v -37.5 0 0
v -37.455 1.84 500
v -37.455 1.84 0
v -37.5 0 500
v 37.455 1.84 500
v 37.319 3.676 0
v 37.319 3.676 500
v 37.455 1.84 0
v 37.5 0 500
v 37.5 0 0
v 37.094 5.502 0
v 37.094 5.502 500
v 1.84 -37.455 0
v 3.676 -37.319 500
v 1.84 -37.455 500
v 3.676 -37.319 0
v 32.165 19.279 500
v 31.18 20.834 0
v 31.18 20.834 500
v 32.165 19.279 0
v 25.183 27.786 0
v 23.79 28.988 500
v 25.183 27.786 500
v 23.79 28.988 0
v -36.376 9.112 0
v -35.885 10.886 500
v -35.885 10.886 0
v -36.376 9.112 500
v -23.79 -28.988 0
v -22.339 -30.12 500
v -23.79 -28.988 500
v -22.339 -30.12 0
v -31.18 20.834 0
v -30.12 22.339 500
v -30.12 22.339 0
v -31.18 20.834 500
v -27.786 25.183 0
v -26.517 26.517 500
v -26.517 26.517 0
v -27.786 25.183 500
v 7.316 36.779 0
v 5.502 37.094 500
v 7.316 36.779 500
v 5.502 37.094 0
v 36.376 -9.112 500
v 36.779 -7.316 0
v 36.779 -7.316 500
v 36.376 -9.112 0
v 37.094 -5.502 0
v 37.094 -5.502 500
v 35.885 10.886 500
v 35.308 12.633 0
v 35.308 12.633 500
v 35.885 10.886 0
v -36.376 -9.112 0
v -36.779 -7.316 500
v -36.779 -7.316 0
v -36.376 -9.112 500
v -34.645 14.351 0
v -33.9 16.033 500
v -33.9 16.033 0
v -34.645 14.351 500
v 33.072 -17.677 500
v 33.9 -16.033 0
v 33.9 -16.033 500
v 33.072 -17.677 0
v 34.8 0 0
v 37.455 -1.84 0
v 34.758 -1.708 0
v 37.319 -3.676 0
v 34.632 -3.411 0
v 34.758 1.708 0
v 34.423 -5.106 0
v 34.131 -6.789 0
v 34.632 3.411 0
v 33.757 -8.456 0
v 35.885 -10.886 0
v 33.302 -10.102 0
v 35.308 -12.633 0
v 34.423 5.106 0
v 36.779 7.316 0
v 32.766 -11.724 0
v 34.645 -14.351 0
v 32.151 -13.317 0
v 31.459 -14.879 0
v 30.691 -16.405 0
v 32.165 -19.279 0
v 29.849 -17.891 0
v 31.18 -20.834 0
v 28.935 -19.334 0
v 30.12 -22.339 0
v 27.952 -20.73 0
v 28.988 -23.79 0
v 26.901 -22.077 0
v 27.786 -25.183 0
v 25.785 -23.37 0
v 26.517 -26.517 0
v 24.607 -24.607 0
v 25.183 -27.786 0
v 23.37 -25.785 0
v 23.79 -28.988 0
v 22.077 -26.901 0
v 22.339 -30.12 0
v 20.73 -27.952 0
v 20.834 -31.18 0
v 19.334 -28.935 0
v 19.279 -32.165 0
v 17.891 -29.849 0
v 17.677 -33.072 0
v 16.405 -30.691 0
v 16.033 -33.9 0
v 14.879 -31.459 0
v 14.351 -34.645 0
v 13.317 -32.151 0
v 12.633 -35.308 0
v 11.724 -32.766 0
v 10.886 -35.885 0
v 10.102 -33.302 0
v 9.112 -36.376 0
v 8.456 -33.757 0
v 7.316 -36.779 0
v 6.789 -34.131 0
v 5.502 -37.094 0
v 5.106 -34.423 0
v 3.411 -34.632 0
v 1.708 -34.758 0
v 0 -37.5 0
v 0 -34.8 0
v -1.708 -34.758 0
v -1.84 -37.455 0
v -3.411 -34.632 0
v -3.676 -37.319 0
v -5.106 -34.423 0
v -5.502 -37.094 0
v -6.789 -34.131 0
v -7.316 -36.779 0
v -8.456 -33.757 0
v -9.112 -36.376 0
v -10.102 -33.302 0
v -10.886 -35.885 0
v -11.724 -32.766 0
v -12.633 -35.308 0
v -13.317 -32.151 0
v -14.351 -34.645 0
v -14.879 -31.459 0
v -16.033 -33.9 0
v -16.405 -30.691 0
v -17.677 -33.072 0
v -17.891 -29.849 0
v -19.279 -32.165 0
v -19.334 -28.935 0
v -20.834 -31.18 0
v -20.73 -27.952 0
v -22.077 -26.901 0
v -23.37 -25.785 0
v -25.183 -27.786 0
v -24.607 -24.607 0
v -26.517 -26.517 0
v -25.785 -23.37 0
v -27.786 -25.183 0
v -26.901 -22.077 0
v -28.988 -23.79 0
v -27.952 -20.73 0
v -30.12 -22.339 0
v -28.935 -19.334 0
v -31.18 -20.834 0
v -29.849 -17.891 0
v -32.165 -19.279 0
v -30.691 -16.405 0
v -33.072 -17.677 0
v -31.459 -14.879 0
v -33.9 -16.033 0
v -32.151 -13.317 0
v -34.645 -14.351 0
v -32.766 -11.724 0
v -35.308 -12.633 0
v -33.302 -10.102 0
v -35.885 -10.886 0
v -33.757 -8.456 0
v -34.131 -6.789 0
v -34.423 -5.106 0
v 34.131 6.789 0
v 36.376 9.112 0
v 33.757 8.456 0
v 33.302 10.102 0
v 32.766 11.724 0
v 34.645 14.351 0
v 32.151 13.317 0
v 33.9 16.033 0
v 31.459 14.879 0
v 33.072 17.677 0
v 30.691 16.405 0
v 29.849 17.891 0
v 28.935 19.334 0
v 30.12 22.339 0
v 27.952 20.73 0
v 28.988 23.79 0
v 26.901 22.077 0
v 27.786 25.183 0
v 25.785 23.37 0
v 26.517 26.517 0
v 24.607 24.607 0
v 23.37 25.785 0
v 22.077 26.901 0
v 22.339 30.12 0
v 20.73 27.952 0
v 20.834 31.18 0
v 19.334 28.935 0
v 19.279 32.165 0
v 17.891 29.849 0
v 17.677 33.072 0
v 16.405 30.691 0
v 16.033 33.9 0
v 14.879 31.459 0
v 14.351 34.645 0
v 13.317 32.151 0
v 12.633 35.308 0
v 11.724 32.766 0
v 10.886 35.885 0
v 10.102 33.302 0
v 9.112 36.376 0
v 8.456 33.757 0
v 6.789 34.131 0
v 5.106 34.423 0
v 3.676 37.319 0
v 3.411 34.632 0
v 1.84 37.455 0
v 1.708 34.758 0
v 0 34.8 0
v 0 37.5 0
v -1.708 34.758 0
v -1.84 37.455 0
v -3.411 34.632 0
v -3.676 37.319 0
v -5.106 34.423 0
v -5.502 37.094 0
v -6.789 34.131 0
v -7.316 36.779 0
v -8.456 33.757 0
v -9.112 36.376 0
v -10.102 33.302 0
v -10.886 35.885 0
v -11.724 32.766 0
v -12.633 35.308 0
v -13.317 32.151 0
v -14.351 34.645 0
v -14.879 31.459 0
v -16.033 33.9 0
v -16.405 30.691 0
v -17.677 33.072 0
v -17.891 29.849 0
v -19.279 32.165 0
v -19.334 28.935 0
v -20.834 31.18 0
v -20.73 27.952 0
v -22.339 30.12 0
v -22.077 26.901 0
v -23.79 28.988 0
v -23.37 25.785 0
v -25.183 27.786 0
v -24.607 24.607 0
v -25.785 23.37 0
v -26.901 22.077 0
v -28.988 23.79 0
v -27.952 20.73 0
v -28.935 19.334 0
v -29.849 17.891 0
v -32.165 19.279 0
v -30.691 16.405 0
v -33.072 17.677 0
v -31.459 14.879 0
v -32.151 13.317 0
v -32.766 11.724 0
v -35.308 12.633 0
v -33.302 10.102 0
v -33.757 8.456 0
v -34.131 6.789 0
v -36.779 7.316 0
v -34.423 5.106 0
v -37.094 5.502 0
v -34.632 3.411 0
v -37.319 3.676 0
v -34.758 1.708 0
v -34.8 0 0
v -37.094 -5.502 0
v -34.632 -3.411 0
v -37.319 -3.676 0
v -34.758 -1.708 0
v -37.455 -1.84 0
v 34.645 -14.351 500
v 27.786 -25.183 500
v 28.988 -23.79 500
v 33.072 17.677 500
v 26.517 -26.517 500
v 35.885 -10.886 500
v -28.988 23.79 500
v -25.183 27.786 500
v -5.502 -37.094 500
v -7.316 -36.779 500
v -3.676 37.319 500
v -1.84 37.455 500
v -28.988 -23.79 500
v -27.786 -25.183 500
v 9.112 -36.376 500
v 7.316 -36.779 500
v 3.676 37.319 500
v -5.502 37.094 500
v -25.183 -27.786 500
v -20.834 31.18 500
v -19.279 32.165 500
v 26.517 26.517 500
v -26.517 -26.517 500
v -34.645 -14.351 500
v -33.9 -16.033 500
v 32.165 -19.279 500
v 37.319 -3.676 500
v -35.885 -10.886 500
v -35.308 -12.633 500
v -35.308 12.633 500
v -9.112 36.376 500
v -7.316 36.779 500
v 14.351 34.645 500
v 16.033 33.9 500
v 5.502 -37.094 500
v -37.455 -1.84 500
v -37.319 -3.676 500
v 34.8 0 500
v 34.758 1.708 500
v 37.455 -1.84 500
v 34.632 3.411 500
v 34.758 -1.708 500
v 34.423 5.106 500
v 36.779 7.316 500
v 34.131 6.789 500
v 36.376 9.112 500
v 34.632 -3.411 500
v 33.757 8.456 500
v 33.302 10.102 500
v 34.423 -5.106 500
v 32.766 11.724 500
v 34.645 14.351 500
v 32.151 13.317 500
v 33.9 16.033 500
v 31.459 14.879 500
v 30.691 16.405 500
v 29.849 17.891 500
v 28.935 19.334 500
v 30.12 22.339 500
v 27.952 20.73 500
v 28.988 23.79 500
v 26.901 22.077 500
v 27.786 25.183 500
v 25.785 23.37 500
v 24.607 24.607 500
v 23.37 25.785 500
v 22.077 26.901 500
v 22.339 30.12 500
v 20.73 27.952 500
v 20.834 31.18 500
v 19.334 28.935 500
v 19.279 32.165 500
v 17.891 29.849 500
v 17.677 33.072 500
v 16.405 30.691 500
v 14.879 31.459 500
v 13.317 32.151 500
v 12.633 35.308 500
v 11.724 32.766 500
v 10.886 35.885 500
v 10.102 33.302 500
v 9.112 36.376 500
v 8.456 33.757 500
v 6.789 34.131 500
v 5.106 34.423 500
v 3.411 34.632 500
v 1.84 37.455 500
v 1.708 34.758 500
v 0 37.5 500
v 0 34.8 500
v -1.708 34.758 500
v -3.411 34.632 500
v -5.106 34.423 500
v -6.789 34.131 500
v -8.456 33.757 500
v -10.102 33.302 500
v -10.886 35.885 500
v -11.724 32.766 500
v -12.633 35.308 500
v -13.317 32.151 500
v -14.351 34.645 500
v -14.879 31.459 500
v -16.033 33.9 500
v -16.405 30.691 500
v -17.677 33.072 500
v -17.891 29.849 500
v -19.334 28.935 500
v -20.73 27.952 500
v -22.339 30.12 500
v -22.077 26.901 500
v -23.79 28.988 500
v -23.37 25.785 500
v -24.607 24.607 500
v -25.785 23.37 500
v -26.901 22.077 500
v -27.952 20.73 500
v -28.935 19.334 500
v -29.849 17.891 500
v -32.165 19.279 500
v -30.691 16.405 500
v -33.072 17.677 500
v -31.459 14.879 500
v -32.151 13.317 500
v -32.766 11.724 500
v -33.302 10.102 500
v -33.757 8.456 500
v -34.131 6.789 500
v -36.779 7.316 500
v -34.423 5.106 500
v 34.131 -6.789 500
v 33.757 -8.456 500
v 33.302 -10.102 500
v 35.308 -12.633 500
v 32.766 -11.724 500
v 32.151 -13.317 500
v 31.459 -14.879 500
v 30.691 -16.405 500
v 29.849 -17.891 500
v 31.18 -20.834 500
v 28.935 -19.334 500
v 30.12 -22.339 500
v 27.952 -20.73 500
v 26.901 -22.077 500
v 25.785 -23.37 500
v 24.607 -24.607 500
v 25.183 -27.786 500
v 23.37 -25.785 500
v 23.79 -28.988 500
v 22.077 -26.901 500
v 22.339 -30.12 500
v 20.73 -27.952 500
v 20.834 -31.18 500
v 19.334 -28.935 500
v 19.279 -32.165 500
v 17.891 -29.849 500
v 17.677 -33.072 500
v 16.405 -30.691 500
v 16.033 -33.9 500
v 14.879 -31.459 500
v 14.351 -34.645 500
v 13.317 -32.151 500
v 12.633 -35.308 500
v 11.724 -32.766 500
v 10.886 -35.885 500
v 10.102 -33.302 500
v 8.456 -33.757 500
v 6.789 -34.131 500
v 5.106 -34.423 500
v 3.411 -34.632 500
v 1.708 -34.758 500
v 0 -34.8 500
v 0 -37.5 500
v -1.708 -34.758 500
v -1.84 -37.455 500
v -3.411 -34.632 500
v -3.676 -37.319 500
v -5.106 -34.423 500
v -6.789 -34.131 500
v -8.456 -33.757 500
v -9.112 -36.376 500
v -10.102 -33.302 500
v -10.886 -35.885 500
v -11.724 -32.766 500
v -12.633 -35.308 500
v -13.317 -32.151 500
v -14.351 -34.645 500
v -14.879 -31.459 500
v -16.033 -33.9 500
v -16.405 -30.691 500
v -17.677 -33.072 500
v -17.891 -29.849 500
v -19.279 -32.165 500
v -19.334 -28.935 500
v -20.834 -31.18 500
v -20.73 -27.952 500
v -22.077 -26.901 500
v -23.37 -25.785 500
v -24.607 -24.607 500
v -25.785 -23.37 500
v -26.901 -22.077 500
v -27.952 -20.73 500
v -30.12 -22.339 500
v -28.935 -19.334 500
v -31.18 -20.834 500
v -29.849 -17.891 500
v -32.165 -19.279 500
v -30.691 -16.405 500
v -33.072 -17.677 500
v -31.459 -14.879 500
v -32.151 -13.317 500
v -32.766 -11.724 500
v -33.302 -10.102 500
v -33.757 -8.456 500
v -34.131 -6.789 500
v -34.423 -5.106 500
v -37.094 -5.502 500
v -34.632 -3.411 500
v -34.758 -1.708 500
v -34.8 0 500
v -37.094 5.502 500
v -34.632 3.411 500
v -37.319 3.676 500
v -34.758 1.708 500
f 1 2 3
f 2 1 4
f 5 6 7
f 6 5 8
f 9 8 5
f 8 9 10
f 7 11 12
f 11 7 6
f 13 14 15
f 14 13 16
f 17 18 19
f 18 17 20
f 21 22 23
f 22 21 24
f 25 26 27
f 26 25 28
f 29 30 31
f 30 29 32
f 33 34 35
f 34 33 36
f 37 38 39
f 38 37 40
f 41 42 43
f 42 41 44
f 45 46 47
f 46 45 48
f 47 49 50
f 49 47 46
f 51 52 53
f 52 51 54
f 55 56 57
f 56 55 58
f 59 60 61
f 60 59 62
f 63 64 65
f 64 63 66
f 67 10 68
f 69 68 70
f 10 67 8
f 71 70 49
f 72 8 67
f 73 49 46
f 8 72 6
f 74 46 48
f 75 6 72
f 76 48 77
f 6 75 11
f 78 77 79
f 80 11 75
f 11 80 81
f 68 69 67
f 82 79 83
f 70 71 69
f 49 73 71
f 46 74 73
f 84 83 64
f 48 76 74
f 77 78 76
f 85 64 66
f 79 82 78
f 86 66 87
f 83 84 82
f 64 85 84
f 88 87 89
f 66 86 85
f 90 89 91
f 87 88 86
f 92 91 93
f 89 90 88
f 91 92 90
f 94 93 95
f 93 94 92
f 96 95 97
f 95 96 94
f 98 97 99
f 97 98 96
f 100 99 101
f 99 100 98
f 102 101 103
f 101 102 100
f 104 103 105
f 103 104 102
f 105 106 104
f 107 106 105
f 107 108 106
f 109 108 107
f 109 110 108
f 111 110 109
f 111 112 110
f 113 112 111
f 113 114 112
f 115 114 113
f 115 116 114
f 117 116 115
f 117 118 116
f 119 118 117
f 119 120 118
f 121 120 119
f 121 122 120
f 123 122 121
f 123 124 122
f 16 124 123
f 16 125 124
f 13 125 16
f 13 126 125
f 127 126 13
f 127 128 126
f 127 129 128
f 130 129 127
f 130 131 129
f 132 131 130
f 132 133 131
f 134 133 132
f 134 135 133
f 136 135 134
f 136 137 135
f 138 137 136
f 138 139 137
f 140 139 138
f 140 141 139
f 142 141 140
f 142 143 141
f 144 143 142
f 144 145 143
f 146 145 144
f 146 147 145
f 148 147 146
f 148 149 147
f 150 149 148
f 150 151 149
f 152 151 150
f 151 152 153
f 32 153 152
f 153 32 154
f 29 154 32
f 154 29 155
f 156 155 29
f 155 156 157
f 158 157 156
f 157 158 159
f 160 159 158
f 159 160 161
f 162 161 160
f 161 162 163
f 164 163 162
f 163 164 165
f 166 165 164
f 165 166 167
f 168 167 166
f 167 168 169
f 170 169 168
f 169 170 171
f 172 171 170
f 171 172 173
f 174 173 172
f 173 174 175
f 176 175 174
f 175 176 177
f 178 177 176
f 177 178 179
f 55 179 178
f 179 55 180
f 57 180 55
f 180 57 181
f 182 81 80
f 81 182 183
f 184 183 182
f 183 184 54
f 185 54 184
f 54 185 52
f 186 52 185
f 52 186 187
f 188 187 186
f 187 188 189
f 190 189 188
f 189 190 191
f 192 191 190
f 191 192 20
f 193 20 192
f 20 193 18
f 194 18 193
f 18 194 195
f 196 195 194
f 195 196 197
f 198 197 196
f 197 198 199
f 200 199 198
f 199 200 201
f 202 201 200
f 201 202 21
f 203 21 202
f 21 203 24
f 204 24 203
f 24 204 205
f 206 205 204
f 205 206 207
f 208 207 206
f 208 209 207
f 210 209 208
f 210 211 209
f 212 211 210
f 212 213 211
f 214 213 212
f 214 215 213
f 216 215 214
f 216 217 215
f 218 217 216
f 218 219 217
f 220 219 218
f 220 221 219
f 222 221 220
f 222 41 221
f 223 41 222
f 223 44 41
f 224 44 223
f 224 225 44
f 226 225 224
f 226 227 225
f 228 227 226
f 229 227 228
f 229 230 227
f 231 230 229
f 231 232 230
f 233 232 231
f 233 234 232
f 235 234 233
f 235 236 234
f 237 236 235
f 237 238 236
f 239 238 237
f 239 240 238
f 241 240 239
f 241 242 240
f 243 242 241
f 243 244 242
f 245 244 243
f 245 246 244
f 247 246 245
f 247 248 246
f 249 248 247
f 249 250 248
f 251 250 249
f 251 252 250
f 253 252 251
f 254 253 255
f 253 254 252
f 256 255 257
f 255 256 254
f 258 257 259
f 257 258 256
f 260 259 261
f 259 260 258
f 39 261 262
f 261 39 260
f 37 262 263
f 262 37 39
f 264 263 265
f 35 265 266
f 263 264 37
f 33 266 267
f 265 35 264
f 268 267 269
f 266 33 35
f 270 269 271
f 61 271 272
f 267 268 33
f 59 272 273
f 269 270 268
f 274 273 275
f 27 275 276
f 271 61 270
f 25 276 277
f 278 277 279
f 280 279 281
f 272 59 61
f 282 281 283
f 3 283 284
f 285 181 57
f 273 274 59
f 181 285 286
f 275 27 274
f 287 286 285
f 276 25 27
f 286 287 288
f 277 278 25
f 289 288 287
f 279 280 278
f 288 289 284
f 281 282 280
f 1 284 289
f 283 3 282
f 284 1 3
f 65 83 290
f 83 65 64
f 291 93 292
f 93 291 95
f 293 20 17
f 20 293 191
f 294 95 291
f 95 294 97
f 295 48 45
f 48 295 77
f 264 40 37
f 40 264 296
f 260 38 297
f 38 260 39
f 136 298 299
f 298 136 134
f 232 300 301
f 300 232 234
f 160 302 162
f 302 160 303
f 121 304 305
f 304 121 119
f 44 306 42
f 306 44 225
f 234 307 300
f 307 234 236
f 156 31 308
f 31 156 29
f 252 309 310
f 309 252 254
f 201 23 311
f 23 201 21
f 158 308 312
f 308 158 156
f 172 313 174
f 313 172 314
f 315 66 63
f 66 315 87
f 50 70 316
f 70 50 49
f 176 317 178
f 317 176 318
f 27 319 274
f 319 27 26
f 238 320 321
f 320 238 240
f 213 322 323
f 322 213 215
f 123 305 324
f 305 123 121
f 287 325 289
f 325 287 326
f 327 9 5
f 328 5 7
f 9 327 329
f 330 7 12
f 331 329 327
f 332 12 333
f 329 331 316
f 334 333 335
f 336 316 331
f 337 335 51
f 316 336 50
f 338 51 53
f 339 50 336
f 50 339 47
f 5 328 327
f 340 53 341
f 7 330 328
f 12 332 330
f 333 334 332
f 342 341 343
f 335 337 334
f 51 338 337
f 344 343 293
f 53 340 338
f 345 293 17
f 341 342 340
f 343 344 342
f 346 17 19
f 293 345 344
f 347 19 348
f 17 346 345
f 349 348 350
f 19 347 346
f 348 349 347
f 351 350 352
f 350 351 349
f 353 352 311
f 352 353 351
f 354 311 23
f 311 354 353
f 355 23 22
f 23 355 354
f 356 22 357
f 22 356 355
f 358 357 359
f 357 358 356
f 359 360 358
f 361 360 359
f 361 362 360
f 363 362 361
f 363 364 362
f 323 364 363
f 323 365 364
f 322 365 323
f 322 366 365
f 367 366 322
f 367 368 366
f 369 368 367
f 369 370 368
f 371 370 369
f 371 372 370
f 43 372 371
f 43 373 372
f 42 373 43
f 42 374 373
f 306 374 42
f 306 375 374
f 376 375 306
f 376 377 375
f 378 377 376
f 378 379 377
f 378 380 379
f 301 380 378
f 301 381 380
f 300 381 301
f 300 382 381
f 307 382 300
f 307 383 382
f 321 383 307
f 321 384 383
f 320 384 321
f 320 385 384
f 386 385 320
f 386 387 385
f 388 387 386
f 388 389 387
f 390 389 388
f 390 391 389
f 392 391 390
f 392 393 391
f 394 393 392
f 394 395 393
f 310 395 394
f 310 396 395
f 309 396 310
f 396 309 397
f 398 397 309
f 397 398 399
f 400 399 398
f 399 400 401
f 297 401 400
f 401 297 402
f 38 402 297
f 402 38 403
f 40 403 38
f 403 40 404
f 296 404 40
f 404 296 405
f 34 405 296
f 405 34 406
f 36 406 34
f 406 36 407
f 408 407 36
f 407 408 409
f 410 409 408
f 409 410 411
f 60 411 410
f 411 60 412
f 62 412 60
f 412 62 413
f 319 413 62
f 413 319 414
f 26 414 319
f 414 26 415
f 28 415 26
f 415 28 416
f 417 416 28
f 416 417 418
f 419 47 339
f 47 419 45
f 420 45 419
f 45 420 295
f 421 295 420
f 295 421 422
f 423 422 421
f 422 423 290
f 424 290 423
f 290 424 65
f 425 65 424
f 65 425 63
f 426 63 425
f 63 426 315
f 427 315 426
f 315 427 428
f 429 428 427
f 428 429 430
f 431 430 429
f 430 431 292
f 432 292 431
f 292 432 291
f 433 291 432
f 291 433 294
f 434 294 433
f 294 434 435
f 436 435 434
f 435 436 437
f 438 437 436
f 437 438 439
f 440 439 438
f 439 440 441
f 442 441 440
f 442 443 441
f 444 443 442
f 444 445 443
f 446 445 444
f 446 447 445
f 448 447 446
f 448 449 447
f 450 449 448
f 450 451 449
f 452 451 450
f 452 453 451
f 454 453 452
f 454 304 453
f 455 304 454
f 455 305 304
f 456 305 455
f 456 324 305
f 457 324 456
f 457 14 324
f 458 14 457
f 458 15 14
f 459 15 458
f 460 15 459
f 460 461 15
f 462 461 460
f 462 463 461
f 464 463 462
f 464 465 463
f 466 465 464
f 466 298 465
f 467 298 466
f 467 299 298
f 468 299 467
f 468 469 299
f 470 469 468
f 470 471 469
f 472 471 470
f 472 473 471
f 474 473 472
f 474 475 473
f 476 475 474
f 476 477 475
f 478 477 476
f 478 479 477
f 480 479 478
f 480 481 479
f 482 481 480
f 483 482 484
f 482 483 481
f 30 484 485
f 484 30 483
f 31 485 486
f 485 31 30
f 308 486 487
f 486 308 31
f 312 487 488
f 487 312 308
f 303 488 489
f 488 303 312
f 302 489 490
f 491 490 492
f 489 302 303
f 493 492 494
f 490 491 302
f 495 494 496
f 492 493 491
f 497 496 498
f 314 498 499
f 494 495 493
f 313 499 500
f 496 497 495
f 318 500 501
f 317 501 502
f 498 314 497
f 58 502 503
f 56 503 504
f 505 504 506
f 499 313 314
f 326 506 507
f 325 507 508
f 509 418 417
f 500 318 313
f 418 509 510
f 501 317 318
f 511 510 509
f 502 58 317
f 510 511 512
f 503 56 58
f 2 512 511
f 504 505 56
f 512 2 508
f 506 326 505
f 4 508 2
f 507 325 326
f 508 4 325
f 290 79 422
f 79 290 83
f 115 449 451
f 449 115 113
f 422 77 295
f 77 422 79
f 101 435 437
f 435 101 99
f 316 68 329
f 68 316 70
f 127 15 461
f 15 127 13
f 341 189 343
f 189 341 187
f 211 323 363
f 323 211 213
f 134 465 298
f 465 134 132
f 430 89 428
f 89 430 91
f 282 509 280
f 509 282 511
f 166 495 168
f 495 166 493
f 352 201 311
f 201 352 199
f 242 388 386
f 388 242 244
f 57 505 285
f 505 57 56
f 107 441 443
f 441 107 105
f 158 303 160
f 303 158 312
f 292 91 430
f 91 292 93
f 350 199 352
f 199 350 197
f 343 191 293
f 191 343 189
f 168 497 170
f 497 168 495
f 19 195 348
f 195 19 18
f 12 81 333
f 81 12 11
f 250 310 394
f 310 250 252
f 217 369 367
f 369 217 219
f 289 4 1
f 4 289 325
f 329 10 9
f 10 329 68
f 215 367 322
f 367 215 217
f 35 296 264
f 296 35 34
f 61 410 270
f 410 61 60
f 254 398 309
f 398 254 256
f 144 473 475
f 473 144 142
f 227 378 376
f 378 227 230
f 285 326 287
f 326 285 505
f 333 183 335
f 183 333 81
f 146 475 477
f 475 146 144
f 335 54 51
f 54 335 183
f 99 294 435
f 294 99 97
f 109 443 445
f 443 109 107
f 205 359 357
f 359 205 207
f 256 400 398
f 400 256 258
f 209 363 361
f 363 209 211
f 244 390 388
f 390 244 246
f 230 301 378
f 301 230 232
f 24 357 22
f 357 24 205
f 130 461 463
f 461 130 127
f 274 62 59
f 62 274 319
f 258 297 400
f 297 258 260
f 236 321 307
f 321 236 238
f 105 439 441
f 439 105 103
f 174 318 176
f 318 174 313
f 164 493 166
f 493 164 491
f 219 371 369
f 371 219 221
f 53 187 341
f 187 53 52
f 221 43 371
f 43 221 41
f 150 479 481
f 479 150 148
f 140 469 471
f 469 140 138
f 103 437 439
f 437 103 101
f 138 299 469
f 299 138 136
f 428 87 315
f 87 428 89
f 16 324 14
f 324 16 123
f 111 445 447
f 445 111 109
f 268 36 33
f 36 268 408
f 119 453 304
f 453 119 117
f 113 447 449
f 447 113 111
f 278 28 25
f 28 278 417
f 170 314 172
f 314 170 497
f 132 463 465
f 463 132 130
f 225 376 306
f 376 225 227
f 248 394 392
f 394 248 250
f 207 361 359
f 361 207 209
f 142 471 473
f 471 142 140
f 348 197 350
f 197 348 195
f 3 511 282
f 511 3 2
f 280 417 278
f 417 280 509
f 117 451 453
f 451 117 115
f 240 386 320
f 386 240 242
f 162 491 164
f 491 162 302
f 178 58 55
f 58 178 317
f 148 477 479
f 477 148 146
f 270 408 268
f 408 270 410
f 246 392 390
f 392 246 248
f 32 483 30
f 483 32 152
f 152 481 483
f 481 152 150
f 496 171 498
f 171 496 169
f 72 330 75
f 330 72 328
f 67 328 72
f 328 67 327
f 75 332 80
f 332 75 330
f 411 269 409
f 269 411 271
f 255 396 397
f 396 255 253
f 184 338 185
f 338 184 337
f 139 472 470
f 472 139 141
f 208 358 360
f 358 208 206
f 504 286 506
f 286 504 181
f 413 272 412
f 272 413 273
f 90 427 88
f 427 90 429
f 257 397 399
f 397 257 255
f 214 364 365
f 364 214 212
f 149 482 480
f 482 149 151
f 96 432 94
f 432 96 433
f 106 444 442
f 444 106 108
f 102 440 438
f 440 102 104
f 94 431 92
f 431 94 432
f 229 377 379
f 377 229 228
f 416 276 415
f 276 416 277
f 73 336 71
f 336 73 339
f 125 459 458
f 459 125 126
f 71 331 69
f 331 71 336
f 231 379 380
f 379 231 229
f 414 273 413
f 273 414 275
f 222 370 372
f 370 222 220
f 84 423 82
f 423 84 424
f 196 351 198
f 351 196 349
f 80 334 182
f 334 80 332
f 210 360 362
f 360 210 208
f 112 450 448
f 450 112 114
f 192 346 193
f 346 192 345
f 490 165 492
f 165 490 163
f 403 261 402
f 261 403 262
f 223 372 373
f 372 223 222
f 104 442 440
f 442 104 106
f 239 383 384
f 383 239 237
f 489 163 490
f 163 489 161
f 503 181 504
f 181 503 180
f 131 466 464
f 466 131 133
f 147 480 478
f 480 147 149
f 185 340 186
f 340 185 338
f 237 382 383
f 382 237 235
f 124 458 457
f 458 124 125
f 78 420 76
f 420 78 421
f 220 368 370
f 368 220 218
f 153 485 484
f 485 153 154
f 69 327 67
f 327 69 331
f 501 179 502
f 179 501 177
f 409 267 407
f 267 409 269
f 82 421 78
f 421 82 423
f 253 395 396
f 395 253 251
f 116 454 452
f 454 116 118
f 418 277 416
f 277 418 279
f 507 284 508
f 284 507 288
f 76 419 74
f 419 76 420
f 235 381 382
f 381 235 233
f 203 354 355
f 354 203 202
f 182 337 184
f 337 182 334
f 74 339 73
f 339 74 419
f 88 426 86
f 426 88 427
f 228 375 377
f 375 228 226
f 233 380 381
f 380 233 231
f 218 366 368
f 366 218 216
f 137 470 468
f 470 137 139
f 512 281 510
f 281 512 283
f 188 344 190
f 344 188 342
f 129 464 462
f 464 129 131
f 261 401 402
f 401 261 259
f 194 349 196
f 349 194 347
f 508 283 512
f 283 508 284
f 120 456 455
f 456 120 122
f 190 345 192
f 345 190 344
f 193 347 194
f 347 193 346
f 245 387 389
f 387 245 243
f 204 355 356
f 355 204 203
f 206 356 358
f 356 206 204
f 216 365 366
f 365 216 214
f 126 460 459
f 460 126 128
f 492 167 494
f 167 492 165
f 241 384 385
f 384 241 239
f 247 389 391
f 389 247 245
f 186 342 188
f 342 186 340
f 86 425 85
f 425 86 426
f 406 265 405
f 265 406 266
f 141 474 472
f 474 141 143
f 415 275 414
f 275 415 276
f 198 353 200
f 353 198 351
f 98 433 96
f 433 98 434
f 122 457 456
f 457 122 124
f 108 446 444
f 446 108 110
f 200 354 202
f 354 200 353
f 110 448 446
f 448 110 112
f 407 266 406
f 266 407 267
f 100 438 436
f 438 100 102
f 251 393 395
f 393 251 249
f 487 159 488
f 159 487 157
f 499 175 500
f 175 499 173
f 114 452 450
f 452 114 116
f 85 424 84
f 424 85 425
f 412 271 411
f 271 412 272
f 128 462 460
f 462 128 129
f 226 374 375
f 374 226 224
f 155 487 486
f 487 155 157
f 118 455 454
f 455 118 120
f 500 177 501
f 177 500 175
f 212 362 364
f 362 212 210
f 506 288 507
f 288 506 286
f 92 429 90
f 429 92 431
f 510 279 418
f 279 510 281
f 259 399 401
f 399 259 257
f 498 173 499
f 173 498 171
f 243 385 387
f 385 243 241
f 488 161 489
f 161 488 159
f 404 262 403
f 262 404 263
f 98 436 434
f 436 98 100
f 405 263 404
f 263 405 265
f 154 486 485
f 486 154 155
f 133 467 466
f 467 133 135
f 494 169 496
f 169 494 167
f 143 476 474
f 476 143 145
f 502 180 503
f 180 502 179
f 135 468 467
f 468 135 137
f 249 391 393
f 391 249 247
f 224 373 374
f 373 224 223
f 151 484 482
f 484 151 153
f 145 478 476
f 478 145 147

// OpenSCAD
$fn = 128;

// HT pipe parameters (approximate for HT 75)
pipe_length = 500;          // mm
outer_diameter = 75;        // mm (nominal)
wall_thickness = 2.7;       // mm (typical HT wall)
inner_diameter = outer_diameter - 2*wall_thickness;

module ht_pipe(od, id, L) {
    difference() {
        cylinder(h = L, d = od);
        translate([0,0,-0.5])
            cylinder(h = L + 1, d = id);
    }
}

ht_pipe(outer_diameter, inner_diameter, pipe_length);
